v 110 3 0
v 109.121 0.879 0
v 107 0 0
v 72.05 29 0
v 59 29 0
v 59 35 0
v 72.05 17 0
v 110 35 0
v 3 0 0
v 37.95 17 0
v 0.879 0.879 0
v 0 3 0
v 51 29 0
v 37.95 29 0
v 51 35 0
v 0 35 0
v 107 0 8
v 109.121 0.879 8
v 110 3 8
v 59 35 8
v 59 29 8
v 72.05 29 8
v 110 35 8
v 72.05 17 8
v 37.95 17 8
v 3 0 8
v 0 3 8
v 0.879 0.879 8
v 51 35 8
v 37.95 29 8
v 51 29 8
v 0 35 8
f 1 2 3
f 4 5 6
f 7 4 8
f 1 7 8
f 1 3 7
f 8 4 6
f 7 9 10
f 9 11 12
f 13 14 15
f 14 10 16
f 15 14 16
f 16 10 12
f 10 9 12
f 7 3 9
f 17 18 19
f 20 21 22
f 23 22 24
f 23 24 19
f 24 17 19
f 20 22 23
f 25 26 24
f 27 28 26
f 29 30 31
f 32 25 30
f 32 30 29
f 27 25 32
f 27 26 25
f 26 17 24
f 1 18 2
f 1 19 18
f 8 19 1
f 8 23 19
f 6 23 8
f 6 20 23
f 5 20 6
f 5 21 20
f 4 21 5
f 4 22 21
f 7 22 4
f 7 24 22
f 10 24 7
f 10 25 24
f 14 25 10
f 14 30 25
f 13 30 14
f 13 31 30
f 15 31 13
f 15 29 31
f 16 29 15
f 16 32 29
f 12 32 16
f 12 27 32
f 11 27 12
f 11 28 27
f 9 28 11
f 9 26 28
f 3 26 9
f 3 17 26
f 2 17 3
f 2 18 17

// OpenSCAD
$fn = 32;

// ----------------------------------------------------------------------
// Window plate: 110 x 35 mm, 1 open windows
// ----------------------------------------------------------------------

// --- parameters (mm) ---
profile_height = 8;       // extrusion height
profile_points = 16;      // points of the closed outline

profile = [[0, 3], [0.879, 0.879], [3, 0], [107, 0], [109.121, 0.879], [110, 3], [110, 35], [59, 35], [59, 29], [72.05, 29], [72.05, 17], [37.95, 17], [37.95, 29], [51, 29], [51, 35], [0, 35]];  // single closed polygon, 16 points, counter clockwise

// --- the one profile operation ---
linear_extrude(height = profile_height) polygon(points = profile);
